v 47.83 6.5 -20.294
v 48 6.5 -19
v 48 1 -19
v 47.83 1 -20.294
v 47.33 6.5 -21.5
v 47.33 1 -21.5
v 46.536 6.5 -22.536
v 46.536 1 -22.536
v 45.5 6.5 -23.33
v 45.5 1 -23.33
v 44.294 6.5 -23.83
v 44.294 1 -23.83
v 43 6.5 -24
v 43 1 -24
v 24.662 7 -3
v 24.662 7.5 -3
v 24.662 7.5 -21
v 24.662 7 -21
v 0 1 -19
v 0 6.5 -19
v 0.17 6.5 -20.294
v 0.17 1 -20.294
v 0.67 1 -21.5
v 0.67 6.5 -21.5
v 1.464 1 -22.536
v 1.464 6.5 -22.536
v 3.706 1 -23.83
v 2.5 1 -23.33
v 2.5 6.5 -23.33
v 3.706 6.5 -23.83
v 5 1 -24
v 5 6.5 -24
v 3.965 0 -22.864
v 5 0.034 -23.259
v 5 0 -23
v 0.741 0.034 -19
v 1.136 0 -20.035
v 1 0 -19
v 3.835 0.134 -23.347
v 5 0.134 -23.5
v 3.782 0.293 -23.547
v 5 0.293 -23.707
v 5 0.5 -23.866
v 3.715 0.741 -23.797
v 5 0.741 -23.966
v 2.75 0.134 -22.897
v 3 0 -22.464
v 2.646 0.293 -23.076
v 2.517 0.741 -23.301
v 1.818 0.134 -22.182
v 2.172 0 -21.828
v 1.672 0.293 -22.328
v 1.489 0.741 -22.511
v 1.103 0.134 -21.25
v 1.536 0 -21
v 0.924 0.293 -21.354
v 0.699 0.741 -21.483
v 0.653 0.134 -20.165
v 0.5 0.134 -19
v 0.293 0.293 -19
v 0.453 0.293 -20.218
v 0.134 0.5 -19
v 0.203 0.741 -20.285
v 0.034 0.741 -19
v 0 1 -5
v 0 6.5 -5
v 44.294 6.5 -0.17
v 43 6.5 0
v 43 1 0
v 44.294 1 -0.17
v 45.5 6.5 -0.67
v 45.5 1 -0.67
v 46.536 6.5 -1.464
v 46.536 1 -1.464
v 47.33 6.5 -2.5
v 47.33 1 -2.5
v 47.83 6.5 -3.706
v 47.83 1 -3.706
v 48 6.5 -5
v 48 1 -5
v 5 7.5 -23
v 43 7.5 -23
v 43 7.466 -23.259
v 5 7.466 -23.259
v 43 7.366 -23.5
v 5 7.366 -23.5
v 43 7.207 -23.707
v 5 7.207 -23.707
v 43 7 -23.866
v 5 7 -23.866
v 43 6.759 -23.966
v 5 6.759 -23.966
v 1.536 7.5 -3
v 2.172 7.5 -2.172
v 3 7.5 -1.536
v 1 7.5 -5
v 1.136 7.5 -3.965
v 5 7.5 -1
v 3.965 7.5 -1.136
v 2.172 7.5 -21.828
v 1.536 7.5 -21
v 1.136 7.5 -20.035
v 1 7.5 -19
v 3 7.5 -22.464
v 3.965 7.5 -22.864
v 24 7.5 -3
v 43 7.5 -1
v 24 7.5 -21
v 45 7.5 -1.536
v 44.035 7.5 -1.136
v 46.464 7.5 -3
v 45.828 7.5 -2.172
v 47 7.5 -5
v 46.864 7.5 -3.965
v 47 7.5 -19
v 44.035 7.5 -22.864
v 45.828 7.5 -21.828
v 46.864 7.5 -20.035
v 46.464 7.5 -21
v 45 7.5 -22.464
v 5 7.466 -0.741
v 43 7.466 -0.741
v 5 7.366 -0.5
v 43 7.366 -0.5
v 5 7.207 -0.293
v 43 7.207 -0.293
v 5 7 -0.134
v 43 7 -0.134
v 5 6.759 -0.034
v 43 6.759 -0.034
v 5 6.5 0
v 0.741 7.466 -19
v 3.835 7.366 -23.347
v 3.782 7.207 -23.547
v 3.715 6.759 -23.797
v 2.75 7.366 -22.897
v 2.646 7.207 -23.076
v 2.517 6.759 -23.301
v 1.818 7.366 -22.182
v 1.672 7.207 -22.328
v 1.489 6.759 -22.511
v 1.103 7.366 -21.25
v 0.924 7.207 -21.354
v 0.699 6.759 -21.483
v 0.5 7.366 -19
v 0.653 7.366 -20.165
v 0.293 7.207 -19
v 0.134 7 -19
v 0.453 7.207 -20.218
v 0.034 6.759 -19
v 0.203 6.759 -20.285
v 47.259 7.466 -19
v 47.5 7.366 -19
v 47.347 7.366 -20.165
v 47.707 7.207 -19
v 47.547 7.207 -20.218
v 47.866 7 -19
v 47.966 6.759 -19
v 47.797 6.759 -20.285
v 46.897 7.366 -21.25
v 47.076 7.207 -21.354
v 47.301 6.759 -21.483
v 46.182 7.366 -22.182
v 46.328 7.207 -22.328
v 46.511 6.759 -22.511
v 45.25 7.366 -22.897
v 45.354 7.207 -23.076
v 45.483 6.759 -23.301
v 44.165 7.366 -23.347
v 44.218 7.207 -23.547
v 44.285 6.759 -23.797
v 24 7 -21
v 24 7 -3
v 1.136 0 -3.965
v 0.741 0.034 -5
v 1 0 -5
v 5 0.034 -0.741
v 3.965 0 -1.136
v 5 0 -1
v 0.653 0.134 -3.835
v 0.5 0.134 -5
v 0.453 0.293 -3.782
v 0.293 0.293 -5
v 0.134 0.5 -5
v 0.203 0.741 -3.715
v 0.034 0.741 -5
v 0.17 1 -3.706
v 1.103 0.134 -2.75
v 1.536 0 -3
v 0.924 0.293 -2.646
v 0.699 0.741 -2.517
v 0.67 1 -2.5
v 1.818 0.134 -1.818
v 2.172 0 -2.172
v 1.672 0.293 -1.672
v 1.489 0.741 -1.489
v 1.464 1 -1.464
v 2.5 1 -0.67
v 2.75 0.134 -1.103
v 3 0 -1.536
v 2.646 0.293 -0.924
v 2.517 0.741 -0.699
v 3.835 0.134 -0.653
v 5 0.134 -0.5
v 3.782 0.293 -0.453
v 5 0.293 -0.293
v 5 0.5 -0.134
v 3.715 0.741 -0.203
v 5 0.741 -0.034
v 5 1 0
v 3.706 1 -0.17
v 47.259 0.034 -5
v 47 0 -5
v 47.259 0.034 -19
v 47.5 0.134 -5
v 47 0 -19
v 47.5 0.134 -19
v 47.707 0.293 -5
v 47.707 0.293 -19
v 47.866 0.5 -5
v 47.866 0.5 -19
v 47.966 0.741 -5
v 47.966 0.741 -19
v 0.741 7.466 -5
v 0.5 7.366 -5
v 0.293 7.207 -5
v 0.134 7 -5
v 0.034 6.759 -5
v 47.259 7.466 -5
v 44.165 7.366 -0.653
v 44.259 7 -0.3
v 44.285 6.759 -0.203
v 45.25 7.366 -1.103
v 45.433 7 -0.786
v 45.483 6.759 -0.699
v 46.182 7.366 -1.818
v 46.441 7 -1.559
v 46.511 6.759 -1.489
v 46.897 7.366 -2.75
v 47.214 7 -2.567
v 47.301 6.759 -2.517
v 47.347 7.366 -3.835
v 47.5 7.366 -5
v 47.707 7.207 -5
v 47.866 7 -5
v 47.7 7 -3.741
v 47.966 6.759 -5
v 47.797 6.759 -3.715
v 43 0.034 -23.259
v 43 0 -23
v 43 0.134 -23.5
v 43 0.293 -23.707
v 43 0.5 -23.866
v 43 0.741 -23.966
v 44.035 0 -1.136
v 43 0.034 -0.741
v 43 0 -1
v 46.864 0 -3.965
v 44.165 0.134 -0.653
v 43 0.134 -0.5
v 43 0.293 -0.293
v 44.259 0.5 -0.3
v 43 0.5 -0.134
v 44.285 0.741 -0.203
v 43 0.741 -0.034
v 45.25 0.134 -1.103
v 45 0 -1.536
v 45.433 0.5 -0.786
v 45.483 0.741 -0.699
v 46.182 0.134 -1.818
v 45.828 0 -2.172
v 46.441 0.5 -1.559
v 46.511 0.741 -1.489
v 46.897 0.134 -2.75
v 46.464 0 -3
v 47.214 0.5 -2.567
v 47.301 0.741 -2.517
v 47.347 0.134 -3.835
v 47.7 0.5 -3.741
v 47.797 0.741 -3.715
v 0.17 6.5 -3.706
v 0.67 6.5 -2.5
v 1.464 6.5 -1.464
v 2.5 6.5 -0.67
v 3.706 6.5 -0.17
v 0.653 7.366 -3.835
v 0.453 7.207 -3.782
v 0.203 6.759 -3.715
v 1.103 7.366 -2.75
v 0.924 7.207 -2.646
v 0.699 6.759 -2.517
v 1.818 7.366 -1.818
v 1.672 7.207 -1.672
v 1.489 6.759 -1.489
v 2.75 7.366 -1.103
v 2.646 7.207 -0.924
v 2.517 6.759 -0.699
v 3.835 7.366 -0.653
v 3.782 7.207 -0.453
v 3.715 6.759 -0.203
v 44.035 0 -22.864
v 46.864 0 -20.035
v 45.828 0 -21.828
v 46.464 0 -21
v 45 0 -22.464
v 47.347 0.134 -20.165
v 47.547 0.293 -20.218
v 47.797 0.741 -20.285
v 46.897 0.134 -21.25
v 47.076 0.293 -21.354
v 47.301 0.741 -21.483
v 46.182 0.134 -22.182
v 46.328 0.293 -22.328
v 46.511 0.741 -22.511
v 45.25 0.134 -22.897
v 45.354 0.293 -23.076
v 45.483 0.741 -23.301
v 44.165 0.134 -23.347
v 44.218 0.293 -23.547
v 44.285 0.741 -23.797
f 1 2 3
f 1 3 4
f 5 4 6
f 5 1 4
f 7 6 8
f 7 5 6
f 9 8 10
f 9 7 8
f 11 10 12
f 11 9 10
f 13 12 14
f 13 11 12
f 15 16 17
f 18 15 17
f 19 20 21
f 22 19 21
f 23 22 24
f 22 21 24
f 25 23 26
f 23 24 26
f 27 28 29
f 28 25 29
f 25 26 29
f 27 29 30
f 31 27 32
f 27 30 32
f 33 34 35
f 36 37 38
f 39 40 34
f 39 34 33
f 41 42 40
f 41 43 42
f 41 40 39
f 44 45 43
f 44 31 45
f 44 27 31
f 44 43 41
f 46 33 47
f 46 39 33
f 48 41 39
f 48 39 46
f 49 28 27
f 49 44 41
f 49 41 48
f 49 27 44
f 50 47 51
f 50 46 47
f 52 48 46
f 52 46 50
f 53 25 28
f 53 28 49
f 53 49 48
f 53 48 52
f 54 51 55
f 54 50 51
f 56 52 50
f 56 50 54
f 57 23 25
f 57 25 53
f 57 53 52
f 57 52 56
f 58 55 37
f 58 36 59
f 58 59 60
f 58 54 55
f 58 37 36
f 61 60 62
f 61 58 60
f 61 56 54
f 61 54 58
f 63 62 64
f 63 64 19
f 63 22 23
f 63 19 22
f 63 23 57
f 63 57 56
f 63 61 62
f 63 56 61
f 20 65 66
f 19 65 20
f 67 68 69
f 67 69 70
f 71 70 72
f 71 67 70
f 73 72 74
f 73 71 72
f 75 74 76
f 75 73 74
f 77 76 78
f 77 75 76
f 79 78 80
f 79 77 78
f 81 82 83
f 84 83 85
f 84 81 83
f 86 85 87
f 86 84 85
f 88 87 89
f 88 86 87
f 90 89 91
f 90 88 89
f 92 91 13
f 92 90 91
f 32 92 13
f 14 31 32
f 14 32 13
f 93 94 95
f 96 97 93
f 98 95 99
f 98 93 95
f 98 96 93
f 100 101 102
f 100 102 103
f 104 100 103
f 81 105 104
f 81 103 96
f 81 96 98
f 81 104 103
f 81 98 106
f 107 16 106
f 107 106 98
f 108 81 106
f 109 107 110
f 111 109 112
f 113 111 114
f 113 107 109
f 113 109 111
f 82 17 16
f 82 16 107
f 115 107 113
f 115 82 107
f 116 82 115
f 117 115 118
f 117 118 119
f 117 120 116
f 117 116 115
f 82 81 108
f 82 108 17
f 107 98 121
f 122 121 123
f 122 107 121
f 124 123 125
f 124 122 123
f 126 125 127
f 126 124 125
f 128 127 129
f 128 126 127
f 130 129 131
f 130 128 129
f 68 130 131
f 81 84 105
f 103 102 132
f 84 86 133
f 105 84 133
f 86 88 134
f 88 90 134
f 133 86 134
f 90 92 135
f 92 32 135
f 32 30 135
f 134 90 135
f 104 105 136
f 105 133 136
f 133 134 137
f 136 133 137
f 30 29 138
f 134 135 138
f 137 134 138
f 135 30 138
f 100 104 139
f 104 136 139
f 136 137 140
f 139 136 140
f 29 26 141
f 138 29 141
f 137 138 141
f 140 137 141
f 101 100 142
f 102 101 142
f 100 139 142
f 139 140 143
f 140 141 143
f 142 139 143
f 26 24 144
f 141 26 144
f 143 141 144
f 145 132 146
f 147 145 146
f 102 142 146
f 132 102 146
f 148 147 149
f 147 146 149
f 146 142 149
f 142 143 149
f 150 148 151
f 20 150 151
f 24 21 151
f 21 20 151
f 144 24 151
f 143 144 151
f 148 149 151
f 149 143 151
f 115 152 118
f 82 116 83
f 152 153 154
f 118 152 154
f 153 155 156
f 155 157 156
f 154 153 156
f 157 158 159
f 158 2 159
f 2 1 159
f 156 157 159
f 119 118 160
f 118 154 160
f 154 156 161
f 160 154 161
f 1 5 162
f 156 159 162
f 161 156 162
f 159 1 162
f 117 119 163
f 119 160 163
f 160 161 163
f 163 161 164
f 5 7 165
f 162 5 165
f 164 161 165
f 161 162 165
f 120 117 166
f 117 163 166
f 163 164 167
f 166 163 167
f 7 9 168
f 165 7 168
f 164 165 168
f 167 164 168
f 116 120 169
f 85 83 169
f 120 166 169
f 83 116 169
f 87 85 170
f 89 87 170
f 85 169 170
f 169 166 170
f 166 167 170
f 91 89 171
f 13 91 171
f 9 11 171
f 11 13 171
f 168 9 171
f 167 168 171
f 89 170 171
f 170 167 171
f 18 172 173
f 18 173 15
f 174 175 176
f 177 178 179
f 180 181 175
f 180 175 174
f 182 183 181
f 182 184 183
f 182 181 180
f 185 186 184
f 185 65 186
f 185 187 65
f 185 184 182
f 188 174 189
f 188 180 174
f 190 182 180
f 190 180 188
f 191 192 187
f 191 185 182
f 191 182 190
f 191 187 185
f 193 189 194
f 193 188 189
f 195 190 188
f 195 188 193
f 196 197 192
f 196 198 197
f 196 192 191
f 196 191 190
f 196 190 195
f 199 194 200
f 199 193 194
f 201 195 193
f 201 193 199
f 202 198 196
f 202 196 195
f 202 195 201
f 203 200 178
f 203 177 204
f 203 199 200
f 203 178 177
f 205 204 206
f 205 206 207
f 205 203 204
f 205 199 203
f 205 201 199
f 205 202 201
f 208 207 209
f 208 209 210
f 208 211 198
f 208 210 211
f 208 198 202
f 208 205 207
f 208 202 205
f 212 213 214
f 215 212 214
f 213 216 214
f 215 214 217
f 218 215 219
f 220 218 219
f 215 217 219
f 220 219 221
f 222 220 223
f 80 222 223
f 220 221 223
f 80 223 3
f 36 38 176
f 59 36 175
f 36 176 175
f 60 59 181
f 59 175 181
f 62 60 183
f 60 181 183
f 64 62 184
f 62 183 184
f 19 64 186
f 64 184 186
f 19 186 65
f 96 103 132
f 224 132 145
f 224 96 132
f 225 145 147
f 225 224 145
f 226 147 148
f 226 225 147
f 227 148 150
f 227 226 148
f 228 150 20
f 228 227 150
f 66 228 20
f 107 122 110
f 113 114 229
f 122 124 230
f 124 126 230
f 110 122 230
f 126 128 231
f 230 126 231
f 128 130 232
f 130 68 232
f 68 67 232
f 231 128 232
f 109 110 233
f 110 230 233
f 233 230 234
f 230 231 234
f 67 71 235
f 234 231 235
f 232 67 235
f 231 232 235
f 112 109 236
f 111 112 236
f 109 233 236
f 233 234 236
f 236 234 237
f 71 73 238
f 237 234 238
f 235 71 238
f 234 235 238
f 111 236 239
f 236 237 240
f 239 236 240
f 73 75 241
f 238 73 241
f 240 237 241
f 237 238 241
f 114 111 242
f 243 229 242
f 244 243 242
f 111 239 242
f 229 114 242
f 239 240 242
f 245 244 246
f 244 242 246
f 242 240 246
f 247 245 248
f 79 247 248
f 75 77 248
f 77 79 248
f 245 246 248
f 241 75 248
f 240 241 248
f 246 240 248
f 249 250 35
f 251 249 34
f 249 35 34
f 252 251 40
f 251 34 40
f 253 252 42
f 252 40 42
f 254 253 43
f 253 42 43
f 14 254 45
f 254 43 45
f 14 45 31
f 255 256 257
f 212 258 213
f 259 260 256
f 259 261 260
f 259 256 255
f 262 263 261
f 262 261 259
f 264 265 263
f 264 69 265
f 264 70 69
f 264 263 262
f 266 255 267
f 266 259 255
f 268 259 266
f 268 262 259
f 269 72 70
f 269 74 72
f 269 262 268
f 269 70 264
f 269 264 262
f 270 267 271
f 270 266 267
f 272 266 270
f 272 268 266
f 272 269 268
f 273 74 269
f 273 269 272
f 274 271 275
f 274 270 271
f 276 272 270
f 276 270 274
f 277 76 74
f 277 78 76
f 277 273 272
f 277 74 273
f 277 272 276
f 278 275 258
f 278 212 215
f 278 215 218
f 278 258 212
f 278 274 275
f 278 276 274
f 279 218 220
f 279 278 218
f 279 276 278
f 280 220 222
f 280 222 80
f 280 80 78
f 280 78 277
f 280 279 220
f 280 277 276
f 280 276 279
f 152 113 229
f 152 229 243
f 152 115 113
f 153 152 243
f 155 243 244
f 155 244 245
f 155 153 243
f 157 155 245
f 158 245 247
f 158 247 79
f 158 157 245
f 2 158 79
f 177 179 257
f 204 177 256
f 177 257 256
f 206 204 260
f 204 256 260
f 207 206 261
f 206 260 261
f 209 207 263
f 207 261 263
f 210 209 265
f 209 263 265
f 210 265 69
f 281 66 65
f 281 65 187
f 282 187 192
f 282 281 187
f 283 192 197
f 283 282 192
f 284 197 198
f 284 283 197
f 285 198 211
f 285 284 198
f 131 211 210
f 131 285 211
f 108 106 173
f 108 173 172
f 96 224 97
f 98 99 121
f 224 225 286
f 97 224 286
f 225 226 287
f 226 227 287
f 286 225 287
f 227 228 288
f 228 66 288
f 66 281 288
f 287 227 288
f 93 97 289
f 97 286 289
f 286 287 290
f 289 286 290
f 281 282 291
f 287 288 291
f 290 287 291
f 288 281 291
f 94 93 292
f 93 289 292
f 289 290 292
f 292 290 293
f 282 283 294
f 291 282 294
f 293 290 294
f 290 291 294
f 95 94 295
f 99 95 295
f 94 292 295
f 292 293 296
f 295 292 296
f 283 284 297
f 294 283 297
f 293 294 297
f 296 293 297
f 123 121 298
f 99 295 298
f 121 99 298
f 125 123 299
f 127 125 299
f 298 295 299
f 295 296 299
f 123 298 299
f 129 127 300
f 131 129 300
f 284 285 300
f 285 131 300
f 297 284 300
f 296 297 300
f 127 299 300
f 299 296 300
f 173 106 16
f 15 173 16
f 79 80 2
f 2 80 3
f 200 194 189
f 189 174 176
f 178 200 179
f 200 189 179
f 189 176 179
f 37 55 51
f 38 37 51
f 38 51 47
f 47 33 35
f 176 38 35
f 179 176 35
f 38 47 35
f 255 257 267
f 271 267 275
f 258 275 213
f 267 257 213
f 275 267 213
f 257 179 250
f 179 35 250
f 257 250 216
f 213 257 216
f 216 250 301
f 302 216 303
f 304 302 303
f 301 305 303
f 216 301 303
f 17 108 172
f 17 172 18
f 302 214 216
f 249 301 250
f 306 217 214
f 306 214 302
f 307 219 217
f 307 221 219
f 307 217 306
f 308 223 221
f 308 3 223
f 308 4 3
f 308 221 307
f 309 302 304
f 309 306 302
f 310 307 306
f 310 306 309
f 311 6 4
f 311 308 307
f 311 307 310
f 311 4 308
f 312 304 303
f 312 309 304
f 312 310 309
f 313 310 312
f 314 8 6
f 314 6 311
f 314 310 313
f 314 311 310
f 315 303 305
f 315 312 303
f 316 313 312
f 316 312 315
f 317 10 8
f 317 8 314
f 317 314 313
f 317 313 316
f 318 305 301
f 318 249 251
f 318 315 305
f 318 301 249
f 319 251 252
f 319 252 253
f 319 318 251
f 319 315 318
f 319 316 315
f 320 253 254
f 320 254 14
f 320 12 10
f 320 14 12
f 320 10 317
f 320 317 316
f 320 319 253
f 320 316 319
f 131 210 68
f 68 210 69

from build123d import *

# Parameters (mm, degrees)
ESQUISSE1_W      = 48
ESQUISSE1_H      = 24
EXTRUSION1_DEPTH = 7.5
CONG_2_R         = 5
CONG_5_R         = 1
CONG_6_R         = 1
ESQUISSE3_W      = 0.662191978
ESQUISSE3_H      = 18
EXTRUSION2_DEPTH = 0.5


with BuildPart() as part:
    # Esquisse1 → Extrusion1 (new body)
    with BuildSketch(Plane(origin=(0, 0, 0), x_dir=(1, 0, 0), z_dir=(0, 1, 0))):
        with Locations((24, 12)):
            Rectangle(ESQUISSE1_W, ESQUISSE1_H)
    extrude(amount=EXTRUSION1_DEPTH)

    # Congé2
    cong_2_edges = [part.edges().sort_by_distance(p)[0] for p in [
        (0, 3.75, -24),
        (48, 3.75, -24),
        (48, 3.75, 0),
        (0, 3.75, 0),
    ]]
    fillet(cong_2_edges, radius=CONG_2_R)

    # Congé5
    cong_5_edges = [part.edges().sort_by_distance(p)[0] for p in [
        (48, 7.5, -12),
        (24, 7.5, 0),
        (0, 7.5, -12),
        (24, 7.5, -24),
        (1.464466094, 7.5, -22.535533906),
        (1.464466094, 7.5, -1.464466094),
        (46.535533906, 7.5, -22.535533906),
        (46.535533906, 7.5, -1.464466094),
    ]]
    fillet(cong_5_edges, radius=CONG_5_R)

    # Congé6
    cong_6_edges = [part.edges().sort_by_distance(p)[0] for p in [
        (48, 0, -12),
        (0, 0, -12),
        (24, 0, -24),
        (24, 0, 0),
        (1.464466094, 0, -22.535533906),
        (1.464466094, 0, -1.464466094),
        (46.535533906, 0, -22.535533906),
        (46.535533906, 0, -1.464466094),
    ]]
    fillet(cong_6_edges, radius=CONG_6_R)

    # Esquisse3 → Extrusion2 (cut)
    with BuildSketch(Plane(origin=(0, 7.5, 0), x_dir=(1, 0, 0), z_dir=(0, 1, 0))):
        with Locations((24.331095989, 12)):
            Rectangle(ESQUISSE3_W, ESQUISSE3_H)
    extrude(amount=-EXTRUSION2_DEPTH, mode=Mode.SUBTRACT)


solid = part.part
